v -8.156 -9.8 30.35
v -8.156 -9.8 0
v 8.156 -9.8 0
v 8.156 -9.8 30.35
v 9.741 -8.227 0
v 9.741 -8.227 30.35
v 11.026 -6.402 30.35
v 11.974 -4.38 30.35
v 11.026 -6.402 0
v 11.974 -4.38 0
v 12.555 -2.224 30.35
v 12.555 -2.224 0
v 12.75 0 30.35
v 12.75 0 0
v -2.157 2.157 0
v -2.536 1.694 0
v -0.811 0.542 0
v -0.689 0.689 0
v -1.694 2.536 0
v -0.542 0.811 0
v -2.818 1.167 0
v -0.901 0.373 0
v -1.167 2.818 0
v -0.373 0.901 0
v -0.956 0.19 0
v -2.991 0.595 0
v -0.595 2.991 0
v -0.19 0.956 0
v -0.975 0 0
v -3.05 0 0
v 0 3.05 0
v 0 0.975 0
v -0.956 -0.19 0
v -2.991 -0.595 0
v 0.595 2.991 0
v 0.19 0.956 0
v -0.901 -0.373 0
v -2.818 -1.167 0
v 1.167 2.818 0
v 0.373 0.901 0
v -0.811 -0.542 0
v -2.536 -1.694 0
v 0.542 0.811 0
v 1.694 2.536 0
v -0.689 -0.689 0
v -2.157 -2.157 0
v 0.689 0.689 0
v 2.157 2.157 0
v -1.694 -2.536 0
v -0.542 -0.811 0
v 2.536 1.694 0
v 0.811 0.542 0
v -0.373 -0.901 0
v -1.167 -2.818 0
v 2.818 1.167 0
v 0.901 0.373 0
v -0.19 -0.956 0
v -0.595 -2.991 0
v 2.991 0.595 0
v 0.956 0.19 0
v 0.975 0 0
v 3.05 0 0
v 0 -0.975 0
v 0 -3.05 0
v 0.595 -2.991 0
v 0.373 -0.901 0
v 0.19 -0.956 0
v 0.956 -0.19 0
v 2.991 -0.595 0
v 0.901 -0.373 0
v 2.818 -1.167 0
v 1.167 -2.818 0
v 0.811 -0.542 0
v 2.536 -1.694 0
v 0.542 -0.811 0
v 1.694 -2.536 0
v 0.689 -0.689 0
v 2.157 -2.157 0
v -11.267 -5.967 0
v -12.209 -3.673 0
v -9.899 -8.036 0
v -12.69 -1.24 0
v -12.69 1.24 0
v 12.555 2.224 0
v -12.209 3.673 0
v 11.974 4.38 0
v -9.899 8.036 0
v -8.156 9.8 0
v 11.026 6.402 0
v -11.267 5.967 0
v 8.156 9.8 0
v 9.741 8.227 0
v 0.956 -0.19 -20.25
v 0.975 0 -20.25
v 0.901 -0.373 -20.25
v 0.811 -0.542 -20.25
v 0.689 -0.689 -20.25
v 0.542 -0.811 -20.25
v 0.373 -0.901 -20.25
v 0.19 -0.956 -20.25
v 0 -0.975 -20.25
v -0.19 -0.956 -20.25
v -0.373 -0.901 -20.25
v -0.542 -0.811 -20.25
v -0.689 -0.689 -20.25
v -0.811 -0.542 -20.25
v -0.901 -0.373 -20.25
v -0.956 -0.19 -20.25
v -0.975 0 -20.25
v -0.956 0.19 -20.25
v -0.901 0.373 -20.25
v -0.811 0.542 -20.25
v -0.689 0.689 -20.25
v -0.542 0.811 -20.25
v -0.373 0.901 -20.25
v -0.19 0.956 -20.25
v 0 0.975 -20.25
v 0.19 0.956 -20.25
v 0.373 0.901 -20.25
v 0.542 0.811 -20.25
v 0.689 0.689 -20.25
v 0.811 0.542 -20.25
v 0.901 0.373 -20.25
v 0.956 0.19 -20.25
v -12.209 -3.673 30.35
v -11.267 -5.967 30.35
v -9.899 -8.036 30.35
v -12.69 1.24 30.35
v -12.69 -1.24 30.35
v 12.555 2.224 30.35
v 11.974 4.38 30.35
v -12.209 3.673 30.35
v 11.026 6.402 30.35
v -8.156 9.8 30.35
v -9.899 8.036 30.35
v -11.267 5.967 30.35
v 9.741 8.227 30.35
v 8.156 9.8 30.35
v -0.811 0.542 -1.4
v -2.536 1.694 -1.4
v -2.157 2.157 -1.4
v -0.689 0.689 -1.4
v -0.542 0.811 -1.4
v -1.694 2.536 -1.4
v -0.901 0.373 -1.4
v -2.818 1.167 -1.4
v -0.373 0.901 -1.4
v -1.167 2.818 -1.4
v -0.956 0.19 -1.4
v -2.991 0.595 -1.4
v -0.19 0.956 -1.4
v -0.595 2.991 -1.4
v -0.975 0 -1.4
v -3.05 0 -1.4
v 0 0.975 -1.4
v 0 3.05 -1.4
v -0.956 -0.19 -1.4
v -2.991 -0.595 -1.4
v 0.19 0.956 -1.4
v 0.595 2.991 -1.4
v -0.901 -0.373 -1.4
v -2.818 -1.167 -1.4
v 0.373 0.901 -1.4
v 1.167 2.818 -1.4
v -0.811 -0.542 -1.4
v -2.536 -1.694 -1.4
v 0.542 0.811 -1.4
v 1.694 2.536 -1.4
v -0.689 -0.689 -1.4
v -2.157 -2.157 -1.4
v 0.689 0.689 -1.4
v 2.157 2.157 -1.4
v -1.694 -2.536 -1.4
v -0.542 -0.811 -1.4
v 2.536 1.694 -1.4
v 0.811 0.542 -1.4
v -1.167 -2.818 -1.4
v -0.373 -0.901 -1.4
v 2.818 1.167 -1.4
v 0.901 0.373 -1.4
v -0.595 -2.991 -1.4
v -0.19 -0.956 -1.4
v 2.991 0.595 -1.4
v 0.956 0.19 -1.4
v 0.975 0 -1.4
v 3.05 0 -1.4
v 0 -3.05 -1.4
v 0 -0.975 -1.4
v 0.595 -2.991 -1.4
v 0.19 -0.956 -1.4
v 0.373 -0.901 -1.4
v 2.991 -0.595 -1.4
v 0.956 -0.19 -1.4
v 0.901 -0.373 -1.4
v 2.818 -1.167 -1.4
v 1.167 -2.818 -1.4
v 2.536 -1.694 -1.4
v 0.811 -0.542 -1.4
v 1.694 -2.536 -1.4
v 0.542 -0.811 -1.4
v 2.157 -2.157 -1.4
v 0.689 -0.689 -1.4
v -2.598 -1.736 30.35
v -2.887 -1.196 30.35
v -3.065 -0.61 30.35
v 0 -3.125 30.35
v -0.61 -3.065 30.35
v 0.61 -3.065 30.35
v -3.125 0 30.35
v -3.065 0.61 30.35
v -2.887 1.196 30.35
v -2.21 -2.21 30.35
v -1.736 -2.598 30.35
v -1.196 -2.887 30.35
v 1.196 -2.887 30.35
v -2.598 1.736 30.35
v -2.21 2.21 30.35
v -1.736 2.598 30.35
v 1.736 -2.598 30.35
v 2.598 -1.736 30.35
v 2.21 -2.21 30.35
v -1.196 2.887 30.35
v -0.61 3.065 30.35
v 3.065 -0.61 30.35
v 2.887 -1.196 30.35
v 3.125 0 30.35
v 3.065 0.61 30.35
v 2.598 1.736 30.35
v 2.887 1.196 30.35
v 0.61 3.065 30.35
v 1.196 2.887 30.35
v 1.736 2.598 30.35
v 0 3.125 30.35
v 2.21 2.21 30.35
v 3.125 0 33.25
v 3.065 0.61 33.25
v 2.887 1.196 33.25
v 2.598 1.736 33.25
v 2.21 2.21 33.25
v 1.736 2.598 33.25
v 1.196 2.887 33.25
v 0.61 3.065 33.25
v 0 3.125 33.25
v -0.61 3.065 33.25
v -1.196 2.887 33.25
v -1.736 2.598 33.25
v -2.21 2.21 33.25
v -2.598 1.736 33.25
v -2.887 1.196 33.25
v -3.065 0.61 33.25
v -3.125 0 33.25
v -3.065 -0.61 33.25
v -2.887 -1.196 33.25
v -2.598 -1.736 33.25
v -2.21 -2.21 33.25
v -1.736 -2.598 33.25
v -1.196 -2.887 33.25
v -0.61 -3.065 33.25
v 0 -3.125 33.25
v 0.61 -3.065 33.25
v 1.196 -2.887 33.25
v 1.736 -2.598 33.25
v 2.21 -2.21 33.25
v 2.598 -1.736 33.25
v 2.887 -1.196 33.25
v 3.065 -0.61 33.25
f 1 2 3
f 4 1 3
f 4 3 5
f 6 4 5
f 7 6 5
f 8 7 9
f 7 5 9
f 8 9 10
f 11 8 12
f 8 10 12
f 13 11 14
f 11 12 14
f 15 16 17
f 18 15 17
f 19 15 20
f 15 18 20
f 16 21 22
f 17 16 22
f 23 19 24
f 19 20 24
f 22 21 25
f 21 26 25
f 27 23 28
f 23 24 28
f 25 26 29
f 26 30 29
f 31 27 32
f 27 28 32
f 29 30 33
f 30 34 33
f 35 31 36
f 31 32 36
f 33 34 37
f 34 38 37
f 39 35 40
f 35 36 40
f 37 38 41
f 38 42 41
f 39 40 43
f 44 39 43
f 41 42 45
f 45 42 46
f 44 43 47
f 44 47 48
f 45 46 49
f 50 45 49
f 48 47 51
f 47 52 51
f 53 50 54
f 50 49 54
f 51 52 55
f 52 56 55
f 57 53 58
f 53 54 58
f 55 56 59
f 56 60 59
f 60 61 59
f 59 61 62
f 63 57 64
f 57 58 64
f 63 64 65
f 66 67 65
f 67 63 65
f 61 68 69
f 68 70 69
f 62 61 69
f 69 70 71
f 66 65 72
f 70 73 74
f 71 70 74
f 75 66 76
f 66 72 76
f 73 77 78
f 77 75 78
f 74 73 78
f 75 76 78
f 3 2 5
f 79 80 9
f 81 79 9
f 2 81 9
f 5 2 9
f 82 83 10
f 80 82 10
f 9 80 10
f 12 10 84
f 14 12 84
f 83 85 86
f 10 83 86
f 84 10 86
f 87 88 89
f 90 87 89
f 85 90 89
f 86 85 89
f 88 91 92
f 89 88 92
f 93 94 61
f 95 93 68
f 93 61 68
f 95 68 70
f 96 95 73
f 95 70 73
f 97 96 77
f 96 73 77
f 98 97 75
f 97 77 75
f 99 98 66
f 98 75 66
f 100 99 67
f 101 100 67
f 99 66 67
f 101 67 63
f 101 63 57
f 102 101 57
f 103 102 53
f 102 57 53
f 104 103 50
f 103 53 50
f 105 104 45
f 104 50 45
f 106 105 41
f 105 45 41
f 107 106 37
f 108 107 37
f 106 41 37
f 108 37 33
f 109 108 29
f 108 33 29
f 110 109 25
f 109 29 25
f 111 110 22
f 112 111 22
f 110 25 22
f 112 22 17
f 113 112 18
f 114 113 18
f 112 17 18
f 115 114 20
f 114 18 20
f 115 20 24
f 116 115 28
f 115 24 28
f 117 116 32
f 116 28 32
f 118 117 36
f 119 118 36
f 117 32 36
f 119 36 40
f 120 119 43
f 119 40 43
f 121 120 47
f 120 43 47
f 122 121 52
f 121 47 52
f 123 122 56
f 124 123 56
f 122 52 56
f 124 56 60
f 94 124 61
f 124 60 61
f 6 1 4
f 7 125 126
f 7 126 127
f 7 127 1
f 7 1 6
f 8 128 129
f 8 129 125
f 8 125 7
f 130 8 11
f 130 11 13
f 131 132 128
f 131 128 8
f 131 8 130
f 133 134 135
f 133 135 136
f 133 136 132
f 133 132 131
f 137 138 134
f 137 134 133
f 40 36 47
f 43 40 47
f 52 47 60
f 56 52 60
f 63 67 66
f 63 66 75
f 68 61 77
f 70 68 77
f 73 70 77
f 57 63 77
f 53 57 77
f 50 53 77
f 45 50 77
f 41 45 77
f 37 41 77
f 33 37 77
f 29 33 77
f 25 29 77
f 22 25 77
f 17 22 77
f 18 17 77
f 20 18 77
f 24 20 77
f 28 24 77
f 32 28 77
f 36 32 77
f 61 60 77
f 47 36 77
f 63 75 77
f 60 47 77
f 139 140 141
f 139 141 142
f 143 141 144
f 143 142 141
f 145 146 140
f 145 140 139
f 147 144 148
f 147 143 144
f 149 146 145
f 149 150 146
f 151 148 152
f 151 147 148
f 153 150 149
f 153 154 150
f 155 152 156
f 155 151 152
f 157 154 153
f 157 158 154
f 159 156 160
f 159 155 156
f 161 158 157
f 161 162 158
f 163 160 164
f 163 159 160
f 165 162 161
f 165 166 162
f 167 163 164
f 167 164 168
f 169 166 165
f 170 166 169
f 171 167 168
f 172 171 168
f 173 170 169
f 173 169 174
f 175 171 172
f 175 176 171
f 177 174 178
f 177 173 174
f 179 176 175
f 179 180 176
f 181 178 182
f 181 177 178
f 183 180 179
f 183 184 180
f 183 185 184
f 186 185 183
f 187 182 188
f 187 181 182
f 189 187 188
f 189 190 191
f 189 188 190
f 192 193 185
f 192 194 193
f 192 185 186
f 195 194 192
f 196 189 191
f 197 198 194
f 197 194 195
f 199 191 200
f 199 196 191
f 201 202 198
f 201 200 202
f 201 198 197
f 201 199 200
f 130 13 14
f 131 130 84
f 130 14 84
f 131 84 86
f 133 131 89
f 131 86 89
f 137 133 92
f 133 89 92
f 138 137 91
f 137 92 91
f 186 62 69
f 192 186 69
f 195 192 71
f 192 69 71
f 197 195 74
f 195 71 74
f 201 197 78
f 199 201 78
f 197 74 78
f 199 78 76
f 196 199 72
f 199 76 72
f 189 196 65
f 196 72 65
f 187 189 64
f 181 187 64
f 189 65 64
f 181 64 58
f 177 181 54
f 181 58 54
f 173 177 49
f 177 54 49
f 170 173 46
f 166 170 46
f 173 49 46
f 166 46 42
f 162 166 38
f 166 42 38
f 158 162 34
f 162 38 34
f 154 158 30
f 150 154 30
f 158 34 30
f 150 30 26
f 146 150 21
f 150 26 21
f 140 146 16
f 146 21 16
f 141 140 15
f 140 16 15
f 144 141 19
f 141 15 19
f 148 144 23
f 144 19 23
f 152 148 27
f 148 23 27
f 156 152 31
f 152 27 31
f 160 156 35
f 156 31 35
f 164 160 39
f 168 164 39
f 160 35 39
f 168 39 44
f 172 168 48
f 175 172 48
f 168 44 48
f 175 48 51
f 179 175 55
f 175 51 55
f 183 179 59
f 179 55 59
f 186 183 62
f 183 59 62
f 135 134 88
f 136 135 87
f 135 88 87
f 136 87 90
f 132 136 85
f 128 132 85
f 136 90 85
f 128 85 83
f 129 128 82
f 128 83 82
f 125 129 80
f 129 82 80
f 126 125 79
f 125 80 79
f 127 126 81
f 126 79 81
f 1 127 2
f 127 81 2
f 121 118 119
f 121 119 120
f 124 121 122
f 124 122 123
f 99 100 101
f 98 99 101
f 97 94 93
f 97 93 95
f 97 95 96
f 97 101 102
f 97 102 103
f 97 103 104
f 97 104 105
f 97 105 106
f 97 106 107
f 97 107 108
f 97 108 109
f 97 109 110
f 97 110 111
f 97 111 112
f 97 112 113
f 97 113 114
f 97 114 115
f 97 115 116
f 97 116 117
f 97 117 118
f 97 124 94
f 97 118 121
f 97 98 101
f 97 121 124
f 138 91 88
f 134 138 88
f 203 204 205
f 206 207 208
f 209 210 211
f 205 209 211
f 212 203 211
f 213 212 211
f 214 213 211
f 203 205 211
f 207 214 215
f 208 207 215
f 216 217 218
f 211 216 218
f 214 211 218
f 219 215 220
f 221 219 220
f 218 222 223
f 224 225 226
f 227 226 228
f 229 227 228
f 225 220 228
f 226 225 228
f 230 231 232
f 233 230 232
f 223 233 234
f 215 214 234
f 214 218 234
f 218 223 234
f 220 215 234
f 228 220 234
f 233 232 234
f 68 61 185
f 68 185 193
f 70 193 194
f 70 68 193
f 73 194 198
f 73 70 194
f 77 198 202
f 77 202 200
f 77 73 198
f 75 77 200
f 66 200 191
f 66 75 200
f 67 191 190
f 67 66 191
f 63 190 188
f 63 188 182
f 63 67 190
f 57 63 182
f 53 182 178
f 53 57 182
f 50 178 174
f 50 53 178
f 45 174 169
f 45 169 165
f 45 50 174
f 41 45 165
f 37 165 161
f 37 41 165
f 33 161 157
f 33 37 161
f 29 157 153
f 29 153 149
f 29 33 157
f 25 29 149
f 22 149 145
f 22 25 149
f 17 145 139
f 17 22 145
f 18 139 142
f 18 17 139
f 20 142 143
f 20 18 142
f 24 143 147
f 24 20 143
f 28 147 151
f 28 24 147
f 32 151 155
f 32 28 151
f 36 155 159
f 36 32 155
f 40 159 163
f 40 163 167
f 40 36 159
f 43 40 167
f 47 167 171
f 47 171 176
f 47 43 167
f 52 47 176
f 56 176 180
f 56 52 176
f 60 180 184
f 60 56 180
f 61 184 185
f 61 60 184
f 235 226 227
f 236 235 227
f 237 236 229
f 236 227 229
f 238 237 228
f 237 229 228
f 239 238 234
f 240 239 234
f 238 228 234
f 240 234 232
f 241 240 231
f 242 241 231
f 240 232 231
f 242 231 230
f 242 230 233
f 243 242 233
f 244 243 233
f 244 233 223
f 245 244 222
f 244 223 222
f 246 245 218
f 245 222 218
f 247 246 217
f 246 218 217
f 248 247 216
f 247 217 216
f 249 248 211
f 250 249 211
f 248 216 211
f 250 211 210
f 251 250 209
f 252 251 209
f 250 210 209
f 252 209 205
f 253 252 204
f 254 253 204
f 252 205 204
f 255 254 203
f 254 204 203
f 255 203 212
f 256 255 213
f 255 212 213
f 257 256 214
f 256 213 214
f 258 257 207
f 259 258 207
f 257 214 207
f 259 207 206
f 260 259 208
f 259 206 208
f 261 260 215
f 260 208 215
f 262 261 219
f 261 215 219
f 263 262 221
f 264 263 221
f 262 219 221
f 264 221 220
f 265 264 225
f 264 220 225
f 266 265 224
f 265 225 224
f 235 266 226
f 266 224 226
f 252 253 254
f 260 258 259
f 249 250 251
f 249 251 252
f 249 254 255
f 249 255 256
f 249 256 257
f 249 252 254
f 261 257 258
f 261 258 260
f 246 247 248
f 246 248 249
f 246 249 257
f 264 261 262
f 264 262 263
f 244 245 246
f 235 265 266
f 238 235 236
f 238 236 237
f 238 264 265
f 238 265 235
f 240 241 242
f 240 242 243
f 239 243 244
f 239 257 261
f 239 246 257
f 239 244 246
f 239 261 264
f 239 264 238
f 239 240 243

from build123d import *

# Parameters (mm, degrees)
F1_DEPTH = 30.35
F2_R     = 3.05
F2_R_2   = 0.975
F3_DEPTH = 1.4
F4_R     = 3.125
F5_DEPTH = 2.9
F6_DEPTH = 20.25


with BuildPart() as f1:
    # F0 (on Top) → F1 (new body)
    with BuildSketch(Plane.XY):
        with BuildLine():
            ThreePointArc((8.156133, -9.8), (11.544548, -5.411645), (12.75, 0))
            ThreePointArc((12.75, 0), (11.544548, 5.411645), (8.156133, 9.8))
            Line((8.156133, 9.8), (-8.156133, 9.8))
            ThreePointArc((-8.156133, 9.8), (-12.75, 0), (-8.156133, -9.8))
            Line((-8.156133, -9.8), (8.156133, -9.8))
        make_face()
    extrude(amount=F1_DEPTH)


with BuildPart() as f3:
    # F2 (on face) → F3 (new body)
    with BuildSketch(Plane(origin=(0, 0, 0), x_dir=(1, 0, 0), z_dir=(0, 0, -1))):
        Circle(F2_R)
        Circle(F2_R_2, mode=Mode.SUBTRACT)
    extrude(amount=F3_DEPTH)


with BuildPart() as f5:
    # F4 (on face) → F5 (new body)
    with BuildSketch(Plane.XY.offset(30.35)):
        Circle(F4_R)
    extrude(amount=F5_DEPTH)


with BuildPart() as f6:
    # F2 (on face) → F6 (new body)
    with BuildSketch(Plane(origin=(0, 0, 0), x_dir=(1, 0, 0), z_dir=(0, 0, -1))):
        Circle(F2_R_2)
    extrude(amount=F6_DEPTH)


solid = Compound([f1.part, f3.part, f5.part, f6.part])
